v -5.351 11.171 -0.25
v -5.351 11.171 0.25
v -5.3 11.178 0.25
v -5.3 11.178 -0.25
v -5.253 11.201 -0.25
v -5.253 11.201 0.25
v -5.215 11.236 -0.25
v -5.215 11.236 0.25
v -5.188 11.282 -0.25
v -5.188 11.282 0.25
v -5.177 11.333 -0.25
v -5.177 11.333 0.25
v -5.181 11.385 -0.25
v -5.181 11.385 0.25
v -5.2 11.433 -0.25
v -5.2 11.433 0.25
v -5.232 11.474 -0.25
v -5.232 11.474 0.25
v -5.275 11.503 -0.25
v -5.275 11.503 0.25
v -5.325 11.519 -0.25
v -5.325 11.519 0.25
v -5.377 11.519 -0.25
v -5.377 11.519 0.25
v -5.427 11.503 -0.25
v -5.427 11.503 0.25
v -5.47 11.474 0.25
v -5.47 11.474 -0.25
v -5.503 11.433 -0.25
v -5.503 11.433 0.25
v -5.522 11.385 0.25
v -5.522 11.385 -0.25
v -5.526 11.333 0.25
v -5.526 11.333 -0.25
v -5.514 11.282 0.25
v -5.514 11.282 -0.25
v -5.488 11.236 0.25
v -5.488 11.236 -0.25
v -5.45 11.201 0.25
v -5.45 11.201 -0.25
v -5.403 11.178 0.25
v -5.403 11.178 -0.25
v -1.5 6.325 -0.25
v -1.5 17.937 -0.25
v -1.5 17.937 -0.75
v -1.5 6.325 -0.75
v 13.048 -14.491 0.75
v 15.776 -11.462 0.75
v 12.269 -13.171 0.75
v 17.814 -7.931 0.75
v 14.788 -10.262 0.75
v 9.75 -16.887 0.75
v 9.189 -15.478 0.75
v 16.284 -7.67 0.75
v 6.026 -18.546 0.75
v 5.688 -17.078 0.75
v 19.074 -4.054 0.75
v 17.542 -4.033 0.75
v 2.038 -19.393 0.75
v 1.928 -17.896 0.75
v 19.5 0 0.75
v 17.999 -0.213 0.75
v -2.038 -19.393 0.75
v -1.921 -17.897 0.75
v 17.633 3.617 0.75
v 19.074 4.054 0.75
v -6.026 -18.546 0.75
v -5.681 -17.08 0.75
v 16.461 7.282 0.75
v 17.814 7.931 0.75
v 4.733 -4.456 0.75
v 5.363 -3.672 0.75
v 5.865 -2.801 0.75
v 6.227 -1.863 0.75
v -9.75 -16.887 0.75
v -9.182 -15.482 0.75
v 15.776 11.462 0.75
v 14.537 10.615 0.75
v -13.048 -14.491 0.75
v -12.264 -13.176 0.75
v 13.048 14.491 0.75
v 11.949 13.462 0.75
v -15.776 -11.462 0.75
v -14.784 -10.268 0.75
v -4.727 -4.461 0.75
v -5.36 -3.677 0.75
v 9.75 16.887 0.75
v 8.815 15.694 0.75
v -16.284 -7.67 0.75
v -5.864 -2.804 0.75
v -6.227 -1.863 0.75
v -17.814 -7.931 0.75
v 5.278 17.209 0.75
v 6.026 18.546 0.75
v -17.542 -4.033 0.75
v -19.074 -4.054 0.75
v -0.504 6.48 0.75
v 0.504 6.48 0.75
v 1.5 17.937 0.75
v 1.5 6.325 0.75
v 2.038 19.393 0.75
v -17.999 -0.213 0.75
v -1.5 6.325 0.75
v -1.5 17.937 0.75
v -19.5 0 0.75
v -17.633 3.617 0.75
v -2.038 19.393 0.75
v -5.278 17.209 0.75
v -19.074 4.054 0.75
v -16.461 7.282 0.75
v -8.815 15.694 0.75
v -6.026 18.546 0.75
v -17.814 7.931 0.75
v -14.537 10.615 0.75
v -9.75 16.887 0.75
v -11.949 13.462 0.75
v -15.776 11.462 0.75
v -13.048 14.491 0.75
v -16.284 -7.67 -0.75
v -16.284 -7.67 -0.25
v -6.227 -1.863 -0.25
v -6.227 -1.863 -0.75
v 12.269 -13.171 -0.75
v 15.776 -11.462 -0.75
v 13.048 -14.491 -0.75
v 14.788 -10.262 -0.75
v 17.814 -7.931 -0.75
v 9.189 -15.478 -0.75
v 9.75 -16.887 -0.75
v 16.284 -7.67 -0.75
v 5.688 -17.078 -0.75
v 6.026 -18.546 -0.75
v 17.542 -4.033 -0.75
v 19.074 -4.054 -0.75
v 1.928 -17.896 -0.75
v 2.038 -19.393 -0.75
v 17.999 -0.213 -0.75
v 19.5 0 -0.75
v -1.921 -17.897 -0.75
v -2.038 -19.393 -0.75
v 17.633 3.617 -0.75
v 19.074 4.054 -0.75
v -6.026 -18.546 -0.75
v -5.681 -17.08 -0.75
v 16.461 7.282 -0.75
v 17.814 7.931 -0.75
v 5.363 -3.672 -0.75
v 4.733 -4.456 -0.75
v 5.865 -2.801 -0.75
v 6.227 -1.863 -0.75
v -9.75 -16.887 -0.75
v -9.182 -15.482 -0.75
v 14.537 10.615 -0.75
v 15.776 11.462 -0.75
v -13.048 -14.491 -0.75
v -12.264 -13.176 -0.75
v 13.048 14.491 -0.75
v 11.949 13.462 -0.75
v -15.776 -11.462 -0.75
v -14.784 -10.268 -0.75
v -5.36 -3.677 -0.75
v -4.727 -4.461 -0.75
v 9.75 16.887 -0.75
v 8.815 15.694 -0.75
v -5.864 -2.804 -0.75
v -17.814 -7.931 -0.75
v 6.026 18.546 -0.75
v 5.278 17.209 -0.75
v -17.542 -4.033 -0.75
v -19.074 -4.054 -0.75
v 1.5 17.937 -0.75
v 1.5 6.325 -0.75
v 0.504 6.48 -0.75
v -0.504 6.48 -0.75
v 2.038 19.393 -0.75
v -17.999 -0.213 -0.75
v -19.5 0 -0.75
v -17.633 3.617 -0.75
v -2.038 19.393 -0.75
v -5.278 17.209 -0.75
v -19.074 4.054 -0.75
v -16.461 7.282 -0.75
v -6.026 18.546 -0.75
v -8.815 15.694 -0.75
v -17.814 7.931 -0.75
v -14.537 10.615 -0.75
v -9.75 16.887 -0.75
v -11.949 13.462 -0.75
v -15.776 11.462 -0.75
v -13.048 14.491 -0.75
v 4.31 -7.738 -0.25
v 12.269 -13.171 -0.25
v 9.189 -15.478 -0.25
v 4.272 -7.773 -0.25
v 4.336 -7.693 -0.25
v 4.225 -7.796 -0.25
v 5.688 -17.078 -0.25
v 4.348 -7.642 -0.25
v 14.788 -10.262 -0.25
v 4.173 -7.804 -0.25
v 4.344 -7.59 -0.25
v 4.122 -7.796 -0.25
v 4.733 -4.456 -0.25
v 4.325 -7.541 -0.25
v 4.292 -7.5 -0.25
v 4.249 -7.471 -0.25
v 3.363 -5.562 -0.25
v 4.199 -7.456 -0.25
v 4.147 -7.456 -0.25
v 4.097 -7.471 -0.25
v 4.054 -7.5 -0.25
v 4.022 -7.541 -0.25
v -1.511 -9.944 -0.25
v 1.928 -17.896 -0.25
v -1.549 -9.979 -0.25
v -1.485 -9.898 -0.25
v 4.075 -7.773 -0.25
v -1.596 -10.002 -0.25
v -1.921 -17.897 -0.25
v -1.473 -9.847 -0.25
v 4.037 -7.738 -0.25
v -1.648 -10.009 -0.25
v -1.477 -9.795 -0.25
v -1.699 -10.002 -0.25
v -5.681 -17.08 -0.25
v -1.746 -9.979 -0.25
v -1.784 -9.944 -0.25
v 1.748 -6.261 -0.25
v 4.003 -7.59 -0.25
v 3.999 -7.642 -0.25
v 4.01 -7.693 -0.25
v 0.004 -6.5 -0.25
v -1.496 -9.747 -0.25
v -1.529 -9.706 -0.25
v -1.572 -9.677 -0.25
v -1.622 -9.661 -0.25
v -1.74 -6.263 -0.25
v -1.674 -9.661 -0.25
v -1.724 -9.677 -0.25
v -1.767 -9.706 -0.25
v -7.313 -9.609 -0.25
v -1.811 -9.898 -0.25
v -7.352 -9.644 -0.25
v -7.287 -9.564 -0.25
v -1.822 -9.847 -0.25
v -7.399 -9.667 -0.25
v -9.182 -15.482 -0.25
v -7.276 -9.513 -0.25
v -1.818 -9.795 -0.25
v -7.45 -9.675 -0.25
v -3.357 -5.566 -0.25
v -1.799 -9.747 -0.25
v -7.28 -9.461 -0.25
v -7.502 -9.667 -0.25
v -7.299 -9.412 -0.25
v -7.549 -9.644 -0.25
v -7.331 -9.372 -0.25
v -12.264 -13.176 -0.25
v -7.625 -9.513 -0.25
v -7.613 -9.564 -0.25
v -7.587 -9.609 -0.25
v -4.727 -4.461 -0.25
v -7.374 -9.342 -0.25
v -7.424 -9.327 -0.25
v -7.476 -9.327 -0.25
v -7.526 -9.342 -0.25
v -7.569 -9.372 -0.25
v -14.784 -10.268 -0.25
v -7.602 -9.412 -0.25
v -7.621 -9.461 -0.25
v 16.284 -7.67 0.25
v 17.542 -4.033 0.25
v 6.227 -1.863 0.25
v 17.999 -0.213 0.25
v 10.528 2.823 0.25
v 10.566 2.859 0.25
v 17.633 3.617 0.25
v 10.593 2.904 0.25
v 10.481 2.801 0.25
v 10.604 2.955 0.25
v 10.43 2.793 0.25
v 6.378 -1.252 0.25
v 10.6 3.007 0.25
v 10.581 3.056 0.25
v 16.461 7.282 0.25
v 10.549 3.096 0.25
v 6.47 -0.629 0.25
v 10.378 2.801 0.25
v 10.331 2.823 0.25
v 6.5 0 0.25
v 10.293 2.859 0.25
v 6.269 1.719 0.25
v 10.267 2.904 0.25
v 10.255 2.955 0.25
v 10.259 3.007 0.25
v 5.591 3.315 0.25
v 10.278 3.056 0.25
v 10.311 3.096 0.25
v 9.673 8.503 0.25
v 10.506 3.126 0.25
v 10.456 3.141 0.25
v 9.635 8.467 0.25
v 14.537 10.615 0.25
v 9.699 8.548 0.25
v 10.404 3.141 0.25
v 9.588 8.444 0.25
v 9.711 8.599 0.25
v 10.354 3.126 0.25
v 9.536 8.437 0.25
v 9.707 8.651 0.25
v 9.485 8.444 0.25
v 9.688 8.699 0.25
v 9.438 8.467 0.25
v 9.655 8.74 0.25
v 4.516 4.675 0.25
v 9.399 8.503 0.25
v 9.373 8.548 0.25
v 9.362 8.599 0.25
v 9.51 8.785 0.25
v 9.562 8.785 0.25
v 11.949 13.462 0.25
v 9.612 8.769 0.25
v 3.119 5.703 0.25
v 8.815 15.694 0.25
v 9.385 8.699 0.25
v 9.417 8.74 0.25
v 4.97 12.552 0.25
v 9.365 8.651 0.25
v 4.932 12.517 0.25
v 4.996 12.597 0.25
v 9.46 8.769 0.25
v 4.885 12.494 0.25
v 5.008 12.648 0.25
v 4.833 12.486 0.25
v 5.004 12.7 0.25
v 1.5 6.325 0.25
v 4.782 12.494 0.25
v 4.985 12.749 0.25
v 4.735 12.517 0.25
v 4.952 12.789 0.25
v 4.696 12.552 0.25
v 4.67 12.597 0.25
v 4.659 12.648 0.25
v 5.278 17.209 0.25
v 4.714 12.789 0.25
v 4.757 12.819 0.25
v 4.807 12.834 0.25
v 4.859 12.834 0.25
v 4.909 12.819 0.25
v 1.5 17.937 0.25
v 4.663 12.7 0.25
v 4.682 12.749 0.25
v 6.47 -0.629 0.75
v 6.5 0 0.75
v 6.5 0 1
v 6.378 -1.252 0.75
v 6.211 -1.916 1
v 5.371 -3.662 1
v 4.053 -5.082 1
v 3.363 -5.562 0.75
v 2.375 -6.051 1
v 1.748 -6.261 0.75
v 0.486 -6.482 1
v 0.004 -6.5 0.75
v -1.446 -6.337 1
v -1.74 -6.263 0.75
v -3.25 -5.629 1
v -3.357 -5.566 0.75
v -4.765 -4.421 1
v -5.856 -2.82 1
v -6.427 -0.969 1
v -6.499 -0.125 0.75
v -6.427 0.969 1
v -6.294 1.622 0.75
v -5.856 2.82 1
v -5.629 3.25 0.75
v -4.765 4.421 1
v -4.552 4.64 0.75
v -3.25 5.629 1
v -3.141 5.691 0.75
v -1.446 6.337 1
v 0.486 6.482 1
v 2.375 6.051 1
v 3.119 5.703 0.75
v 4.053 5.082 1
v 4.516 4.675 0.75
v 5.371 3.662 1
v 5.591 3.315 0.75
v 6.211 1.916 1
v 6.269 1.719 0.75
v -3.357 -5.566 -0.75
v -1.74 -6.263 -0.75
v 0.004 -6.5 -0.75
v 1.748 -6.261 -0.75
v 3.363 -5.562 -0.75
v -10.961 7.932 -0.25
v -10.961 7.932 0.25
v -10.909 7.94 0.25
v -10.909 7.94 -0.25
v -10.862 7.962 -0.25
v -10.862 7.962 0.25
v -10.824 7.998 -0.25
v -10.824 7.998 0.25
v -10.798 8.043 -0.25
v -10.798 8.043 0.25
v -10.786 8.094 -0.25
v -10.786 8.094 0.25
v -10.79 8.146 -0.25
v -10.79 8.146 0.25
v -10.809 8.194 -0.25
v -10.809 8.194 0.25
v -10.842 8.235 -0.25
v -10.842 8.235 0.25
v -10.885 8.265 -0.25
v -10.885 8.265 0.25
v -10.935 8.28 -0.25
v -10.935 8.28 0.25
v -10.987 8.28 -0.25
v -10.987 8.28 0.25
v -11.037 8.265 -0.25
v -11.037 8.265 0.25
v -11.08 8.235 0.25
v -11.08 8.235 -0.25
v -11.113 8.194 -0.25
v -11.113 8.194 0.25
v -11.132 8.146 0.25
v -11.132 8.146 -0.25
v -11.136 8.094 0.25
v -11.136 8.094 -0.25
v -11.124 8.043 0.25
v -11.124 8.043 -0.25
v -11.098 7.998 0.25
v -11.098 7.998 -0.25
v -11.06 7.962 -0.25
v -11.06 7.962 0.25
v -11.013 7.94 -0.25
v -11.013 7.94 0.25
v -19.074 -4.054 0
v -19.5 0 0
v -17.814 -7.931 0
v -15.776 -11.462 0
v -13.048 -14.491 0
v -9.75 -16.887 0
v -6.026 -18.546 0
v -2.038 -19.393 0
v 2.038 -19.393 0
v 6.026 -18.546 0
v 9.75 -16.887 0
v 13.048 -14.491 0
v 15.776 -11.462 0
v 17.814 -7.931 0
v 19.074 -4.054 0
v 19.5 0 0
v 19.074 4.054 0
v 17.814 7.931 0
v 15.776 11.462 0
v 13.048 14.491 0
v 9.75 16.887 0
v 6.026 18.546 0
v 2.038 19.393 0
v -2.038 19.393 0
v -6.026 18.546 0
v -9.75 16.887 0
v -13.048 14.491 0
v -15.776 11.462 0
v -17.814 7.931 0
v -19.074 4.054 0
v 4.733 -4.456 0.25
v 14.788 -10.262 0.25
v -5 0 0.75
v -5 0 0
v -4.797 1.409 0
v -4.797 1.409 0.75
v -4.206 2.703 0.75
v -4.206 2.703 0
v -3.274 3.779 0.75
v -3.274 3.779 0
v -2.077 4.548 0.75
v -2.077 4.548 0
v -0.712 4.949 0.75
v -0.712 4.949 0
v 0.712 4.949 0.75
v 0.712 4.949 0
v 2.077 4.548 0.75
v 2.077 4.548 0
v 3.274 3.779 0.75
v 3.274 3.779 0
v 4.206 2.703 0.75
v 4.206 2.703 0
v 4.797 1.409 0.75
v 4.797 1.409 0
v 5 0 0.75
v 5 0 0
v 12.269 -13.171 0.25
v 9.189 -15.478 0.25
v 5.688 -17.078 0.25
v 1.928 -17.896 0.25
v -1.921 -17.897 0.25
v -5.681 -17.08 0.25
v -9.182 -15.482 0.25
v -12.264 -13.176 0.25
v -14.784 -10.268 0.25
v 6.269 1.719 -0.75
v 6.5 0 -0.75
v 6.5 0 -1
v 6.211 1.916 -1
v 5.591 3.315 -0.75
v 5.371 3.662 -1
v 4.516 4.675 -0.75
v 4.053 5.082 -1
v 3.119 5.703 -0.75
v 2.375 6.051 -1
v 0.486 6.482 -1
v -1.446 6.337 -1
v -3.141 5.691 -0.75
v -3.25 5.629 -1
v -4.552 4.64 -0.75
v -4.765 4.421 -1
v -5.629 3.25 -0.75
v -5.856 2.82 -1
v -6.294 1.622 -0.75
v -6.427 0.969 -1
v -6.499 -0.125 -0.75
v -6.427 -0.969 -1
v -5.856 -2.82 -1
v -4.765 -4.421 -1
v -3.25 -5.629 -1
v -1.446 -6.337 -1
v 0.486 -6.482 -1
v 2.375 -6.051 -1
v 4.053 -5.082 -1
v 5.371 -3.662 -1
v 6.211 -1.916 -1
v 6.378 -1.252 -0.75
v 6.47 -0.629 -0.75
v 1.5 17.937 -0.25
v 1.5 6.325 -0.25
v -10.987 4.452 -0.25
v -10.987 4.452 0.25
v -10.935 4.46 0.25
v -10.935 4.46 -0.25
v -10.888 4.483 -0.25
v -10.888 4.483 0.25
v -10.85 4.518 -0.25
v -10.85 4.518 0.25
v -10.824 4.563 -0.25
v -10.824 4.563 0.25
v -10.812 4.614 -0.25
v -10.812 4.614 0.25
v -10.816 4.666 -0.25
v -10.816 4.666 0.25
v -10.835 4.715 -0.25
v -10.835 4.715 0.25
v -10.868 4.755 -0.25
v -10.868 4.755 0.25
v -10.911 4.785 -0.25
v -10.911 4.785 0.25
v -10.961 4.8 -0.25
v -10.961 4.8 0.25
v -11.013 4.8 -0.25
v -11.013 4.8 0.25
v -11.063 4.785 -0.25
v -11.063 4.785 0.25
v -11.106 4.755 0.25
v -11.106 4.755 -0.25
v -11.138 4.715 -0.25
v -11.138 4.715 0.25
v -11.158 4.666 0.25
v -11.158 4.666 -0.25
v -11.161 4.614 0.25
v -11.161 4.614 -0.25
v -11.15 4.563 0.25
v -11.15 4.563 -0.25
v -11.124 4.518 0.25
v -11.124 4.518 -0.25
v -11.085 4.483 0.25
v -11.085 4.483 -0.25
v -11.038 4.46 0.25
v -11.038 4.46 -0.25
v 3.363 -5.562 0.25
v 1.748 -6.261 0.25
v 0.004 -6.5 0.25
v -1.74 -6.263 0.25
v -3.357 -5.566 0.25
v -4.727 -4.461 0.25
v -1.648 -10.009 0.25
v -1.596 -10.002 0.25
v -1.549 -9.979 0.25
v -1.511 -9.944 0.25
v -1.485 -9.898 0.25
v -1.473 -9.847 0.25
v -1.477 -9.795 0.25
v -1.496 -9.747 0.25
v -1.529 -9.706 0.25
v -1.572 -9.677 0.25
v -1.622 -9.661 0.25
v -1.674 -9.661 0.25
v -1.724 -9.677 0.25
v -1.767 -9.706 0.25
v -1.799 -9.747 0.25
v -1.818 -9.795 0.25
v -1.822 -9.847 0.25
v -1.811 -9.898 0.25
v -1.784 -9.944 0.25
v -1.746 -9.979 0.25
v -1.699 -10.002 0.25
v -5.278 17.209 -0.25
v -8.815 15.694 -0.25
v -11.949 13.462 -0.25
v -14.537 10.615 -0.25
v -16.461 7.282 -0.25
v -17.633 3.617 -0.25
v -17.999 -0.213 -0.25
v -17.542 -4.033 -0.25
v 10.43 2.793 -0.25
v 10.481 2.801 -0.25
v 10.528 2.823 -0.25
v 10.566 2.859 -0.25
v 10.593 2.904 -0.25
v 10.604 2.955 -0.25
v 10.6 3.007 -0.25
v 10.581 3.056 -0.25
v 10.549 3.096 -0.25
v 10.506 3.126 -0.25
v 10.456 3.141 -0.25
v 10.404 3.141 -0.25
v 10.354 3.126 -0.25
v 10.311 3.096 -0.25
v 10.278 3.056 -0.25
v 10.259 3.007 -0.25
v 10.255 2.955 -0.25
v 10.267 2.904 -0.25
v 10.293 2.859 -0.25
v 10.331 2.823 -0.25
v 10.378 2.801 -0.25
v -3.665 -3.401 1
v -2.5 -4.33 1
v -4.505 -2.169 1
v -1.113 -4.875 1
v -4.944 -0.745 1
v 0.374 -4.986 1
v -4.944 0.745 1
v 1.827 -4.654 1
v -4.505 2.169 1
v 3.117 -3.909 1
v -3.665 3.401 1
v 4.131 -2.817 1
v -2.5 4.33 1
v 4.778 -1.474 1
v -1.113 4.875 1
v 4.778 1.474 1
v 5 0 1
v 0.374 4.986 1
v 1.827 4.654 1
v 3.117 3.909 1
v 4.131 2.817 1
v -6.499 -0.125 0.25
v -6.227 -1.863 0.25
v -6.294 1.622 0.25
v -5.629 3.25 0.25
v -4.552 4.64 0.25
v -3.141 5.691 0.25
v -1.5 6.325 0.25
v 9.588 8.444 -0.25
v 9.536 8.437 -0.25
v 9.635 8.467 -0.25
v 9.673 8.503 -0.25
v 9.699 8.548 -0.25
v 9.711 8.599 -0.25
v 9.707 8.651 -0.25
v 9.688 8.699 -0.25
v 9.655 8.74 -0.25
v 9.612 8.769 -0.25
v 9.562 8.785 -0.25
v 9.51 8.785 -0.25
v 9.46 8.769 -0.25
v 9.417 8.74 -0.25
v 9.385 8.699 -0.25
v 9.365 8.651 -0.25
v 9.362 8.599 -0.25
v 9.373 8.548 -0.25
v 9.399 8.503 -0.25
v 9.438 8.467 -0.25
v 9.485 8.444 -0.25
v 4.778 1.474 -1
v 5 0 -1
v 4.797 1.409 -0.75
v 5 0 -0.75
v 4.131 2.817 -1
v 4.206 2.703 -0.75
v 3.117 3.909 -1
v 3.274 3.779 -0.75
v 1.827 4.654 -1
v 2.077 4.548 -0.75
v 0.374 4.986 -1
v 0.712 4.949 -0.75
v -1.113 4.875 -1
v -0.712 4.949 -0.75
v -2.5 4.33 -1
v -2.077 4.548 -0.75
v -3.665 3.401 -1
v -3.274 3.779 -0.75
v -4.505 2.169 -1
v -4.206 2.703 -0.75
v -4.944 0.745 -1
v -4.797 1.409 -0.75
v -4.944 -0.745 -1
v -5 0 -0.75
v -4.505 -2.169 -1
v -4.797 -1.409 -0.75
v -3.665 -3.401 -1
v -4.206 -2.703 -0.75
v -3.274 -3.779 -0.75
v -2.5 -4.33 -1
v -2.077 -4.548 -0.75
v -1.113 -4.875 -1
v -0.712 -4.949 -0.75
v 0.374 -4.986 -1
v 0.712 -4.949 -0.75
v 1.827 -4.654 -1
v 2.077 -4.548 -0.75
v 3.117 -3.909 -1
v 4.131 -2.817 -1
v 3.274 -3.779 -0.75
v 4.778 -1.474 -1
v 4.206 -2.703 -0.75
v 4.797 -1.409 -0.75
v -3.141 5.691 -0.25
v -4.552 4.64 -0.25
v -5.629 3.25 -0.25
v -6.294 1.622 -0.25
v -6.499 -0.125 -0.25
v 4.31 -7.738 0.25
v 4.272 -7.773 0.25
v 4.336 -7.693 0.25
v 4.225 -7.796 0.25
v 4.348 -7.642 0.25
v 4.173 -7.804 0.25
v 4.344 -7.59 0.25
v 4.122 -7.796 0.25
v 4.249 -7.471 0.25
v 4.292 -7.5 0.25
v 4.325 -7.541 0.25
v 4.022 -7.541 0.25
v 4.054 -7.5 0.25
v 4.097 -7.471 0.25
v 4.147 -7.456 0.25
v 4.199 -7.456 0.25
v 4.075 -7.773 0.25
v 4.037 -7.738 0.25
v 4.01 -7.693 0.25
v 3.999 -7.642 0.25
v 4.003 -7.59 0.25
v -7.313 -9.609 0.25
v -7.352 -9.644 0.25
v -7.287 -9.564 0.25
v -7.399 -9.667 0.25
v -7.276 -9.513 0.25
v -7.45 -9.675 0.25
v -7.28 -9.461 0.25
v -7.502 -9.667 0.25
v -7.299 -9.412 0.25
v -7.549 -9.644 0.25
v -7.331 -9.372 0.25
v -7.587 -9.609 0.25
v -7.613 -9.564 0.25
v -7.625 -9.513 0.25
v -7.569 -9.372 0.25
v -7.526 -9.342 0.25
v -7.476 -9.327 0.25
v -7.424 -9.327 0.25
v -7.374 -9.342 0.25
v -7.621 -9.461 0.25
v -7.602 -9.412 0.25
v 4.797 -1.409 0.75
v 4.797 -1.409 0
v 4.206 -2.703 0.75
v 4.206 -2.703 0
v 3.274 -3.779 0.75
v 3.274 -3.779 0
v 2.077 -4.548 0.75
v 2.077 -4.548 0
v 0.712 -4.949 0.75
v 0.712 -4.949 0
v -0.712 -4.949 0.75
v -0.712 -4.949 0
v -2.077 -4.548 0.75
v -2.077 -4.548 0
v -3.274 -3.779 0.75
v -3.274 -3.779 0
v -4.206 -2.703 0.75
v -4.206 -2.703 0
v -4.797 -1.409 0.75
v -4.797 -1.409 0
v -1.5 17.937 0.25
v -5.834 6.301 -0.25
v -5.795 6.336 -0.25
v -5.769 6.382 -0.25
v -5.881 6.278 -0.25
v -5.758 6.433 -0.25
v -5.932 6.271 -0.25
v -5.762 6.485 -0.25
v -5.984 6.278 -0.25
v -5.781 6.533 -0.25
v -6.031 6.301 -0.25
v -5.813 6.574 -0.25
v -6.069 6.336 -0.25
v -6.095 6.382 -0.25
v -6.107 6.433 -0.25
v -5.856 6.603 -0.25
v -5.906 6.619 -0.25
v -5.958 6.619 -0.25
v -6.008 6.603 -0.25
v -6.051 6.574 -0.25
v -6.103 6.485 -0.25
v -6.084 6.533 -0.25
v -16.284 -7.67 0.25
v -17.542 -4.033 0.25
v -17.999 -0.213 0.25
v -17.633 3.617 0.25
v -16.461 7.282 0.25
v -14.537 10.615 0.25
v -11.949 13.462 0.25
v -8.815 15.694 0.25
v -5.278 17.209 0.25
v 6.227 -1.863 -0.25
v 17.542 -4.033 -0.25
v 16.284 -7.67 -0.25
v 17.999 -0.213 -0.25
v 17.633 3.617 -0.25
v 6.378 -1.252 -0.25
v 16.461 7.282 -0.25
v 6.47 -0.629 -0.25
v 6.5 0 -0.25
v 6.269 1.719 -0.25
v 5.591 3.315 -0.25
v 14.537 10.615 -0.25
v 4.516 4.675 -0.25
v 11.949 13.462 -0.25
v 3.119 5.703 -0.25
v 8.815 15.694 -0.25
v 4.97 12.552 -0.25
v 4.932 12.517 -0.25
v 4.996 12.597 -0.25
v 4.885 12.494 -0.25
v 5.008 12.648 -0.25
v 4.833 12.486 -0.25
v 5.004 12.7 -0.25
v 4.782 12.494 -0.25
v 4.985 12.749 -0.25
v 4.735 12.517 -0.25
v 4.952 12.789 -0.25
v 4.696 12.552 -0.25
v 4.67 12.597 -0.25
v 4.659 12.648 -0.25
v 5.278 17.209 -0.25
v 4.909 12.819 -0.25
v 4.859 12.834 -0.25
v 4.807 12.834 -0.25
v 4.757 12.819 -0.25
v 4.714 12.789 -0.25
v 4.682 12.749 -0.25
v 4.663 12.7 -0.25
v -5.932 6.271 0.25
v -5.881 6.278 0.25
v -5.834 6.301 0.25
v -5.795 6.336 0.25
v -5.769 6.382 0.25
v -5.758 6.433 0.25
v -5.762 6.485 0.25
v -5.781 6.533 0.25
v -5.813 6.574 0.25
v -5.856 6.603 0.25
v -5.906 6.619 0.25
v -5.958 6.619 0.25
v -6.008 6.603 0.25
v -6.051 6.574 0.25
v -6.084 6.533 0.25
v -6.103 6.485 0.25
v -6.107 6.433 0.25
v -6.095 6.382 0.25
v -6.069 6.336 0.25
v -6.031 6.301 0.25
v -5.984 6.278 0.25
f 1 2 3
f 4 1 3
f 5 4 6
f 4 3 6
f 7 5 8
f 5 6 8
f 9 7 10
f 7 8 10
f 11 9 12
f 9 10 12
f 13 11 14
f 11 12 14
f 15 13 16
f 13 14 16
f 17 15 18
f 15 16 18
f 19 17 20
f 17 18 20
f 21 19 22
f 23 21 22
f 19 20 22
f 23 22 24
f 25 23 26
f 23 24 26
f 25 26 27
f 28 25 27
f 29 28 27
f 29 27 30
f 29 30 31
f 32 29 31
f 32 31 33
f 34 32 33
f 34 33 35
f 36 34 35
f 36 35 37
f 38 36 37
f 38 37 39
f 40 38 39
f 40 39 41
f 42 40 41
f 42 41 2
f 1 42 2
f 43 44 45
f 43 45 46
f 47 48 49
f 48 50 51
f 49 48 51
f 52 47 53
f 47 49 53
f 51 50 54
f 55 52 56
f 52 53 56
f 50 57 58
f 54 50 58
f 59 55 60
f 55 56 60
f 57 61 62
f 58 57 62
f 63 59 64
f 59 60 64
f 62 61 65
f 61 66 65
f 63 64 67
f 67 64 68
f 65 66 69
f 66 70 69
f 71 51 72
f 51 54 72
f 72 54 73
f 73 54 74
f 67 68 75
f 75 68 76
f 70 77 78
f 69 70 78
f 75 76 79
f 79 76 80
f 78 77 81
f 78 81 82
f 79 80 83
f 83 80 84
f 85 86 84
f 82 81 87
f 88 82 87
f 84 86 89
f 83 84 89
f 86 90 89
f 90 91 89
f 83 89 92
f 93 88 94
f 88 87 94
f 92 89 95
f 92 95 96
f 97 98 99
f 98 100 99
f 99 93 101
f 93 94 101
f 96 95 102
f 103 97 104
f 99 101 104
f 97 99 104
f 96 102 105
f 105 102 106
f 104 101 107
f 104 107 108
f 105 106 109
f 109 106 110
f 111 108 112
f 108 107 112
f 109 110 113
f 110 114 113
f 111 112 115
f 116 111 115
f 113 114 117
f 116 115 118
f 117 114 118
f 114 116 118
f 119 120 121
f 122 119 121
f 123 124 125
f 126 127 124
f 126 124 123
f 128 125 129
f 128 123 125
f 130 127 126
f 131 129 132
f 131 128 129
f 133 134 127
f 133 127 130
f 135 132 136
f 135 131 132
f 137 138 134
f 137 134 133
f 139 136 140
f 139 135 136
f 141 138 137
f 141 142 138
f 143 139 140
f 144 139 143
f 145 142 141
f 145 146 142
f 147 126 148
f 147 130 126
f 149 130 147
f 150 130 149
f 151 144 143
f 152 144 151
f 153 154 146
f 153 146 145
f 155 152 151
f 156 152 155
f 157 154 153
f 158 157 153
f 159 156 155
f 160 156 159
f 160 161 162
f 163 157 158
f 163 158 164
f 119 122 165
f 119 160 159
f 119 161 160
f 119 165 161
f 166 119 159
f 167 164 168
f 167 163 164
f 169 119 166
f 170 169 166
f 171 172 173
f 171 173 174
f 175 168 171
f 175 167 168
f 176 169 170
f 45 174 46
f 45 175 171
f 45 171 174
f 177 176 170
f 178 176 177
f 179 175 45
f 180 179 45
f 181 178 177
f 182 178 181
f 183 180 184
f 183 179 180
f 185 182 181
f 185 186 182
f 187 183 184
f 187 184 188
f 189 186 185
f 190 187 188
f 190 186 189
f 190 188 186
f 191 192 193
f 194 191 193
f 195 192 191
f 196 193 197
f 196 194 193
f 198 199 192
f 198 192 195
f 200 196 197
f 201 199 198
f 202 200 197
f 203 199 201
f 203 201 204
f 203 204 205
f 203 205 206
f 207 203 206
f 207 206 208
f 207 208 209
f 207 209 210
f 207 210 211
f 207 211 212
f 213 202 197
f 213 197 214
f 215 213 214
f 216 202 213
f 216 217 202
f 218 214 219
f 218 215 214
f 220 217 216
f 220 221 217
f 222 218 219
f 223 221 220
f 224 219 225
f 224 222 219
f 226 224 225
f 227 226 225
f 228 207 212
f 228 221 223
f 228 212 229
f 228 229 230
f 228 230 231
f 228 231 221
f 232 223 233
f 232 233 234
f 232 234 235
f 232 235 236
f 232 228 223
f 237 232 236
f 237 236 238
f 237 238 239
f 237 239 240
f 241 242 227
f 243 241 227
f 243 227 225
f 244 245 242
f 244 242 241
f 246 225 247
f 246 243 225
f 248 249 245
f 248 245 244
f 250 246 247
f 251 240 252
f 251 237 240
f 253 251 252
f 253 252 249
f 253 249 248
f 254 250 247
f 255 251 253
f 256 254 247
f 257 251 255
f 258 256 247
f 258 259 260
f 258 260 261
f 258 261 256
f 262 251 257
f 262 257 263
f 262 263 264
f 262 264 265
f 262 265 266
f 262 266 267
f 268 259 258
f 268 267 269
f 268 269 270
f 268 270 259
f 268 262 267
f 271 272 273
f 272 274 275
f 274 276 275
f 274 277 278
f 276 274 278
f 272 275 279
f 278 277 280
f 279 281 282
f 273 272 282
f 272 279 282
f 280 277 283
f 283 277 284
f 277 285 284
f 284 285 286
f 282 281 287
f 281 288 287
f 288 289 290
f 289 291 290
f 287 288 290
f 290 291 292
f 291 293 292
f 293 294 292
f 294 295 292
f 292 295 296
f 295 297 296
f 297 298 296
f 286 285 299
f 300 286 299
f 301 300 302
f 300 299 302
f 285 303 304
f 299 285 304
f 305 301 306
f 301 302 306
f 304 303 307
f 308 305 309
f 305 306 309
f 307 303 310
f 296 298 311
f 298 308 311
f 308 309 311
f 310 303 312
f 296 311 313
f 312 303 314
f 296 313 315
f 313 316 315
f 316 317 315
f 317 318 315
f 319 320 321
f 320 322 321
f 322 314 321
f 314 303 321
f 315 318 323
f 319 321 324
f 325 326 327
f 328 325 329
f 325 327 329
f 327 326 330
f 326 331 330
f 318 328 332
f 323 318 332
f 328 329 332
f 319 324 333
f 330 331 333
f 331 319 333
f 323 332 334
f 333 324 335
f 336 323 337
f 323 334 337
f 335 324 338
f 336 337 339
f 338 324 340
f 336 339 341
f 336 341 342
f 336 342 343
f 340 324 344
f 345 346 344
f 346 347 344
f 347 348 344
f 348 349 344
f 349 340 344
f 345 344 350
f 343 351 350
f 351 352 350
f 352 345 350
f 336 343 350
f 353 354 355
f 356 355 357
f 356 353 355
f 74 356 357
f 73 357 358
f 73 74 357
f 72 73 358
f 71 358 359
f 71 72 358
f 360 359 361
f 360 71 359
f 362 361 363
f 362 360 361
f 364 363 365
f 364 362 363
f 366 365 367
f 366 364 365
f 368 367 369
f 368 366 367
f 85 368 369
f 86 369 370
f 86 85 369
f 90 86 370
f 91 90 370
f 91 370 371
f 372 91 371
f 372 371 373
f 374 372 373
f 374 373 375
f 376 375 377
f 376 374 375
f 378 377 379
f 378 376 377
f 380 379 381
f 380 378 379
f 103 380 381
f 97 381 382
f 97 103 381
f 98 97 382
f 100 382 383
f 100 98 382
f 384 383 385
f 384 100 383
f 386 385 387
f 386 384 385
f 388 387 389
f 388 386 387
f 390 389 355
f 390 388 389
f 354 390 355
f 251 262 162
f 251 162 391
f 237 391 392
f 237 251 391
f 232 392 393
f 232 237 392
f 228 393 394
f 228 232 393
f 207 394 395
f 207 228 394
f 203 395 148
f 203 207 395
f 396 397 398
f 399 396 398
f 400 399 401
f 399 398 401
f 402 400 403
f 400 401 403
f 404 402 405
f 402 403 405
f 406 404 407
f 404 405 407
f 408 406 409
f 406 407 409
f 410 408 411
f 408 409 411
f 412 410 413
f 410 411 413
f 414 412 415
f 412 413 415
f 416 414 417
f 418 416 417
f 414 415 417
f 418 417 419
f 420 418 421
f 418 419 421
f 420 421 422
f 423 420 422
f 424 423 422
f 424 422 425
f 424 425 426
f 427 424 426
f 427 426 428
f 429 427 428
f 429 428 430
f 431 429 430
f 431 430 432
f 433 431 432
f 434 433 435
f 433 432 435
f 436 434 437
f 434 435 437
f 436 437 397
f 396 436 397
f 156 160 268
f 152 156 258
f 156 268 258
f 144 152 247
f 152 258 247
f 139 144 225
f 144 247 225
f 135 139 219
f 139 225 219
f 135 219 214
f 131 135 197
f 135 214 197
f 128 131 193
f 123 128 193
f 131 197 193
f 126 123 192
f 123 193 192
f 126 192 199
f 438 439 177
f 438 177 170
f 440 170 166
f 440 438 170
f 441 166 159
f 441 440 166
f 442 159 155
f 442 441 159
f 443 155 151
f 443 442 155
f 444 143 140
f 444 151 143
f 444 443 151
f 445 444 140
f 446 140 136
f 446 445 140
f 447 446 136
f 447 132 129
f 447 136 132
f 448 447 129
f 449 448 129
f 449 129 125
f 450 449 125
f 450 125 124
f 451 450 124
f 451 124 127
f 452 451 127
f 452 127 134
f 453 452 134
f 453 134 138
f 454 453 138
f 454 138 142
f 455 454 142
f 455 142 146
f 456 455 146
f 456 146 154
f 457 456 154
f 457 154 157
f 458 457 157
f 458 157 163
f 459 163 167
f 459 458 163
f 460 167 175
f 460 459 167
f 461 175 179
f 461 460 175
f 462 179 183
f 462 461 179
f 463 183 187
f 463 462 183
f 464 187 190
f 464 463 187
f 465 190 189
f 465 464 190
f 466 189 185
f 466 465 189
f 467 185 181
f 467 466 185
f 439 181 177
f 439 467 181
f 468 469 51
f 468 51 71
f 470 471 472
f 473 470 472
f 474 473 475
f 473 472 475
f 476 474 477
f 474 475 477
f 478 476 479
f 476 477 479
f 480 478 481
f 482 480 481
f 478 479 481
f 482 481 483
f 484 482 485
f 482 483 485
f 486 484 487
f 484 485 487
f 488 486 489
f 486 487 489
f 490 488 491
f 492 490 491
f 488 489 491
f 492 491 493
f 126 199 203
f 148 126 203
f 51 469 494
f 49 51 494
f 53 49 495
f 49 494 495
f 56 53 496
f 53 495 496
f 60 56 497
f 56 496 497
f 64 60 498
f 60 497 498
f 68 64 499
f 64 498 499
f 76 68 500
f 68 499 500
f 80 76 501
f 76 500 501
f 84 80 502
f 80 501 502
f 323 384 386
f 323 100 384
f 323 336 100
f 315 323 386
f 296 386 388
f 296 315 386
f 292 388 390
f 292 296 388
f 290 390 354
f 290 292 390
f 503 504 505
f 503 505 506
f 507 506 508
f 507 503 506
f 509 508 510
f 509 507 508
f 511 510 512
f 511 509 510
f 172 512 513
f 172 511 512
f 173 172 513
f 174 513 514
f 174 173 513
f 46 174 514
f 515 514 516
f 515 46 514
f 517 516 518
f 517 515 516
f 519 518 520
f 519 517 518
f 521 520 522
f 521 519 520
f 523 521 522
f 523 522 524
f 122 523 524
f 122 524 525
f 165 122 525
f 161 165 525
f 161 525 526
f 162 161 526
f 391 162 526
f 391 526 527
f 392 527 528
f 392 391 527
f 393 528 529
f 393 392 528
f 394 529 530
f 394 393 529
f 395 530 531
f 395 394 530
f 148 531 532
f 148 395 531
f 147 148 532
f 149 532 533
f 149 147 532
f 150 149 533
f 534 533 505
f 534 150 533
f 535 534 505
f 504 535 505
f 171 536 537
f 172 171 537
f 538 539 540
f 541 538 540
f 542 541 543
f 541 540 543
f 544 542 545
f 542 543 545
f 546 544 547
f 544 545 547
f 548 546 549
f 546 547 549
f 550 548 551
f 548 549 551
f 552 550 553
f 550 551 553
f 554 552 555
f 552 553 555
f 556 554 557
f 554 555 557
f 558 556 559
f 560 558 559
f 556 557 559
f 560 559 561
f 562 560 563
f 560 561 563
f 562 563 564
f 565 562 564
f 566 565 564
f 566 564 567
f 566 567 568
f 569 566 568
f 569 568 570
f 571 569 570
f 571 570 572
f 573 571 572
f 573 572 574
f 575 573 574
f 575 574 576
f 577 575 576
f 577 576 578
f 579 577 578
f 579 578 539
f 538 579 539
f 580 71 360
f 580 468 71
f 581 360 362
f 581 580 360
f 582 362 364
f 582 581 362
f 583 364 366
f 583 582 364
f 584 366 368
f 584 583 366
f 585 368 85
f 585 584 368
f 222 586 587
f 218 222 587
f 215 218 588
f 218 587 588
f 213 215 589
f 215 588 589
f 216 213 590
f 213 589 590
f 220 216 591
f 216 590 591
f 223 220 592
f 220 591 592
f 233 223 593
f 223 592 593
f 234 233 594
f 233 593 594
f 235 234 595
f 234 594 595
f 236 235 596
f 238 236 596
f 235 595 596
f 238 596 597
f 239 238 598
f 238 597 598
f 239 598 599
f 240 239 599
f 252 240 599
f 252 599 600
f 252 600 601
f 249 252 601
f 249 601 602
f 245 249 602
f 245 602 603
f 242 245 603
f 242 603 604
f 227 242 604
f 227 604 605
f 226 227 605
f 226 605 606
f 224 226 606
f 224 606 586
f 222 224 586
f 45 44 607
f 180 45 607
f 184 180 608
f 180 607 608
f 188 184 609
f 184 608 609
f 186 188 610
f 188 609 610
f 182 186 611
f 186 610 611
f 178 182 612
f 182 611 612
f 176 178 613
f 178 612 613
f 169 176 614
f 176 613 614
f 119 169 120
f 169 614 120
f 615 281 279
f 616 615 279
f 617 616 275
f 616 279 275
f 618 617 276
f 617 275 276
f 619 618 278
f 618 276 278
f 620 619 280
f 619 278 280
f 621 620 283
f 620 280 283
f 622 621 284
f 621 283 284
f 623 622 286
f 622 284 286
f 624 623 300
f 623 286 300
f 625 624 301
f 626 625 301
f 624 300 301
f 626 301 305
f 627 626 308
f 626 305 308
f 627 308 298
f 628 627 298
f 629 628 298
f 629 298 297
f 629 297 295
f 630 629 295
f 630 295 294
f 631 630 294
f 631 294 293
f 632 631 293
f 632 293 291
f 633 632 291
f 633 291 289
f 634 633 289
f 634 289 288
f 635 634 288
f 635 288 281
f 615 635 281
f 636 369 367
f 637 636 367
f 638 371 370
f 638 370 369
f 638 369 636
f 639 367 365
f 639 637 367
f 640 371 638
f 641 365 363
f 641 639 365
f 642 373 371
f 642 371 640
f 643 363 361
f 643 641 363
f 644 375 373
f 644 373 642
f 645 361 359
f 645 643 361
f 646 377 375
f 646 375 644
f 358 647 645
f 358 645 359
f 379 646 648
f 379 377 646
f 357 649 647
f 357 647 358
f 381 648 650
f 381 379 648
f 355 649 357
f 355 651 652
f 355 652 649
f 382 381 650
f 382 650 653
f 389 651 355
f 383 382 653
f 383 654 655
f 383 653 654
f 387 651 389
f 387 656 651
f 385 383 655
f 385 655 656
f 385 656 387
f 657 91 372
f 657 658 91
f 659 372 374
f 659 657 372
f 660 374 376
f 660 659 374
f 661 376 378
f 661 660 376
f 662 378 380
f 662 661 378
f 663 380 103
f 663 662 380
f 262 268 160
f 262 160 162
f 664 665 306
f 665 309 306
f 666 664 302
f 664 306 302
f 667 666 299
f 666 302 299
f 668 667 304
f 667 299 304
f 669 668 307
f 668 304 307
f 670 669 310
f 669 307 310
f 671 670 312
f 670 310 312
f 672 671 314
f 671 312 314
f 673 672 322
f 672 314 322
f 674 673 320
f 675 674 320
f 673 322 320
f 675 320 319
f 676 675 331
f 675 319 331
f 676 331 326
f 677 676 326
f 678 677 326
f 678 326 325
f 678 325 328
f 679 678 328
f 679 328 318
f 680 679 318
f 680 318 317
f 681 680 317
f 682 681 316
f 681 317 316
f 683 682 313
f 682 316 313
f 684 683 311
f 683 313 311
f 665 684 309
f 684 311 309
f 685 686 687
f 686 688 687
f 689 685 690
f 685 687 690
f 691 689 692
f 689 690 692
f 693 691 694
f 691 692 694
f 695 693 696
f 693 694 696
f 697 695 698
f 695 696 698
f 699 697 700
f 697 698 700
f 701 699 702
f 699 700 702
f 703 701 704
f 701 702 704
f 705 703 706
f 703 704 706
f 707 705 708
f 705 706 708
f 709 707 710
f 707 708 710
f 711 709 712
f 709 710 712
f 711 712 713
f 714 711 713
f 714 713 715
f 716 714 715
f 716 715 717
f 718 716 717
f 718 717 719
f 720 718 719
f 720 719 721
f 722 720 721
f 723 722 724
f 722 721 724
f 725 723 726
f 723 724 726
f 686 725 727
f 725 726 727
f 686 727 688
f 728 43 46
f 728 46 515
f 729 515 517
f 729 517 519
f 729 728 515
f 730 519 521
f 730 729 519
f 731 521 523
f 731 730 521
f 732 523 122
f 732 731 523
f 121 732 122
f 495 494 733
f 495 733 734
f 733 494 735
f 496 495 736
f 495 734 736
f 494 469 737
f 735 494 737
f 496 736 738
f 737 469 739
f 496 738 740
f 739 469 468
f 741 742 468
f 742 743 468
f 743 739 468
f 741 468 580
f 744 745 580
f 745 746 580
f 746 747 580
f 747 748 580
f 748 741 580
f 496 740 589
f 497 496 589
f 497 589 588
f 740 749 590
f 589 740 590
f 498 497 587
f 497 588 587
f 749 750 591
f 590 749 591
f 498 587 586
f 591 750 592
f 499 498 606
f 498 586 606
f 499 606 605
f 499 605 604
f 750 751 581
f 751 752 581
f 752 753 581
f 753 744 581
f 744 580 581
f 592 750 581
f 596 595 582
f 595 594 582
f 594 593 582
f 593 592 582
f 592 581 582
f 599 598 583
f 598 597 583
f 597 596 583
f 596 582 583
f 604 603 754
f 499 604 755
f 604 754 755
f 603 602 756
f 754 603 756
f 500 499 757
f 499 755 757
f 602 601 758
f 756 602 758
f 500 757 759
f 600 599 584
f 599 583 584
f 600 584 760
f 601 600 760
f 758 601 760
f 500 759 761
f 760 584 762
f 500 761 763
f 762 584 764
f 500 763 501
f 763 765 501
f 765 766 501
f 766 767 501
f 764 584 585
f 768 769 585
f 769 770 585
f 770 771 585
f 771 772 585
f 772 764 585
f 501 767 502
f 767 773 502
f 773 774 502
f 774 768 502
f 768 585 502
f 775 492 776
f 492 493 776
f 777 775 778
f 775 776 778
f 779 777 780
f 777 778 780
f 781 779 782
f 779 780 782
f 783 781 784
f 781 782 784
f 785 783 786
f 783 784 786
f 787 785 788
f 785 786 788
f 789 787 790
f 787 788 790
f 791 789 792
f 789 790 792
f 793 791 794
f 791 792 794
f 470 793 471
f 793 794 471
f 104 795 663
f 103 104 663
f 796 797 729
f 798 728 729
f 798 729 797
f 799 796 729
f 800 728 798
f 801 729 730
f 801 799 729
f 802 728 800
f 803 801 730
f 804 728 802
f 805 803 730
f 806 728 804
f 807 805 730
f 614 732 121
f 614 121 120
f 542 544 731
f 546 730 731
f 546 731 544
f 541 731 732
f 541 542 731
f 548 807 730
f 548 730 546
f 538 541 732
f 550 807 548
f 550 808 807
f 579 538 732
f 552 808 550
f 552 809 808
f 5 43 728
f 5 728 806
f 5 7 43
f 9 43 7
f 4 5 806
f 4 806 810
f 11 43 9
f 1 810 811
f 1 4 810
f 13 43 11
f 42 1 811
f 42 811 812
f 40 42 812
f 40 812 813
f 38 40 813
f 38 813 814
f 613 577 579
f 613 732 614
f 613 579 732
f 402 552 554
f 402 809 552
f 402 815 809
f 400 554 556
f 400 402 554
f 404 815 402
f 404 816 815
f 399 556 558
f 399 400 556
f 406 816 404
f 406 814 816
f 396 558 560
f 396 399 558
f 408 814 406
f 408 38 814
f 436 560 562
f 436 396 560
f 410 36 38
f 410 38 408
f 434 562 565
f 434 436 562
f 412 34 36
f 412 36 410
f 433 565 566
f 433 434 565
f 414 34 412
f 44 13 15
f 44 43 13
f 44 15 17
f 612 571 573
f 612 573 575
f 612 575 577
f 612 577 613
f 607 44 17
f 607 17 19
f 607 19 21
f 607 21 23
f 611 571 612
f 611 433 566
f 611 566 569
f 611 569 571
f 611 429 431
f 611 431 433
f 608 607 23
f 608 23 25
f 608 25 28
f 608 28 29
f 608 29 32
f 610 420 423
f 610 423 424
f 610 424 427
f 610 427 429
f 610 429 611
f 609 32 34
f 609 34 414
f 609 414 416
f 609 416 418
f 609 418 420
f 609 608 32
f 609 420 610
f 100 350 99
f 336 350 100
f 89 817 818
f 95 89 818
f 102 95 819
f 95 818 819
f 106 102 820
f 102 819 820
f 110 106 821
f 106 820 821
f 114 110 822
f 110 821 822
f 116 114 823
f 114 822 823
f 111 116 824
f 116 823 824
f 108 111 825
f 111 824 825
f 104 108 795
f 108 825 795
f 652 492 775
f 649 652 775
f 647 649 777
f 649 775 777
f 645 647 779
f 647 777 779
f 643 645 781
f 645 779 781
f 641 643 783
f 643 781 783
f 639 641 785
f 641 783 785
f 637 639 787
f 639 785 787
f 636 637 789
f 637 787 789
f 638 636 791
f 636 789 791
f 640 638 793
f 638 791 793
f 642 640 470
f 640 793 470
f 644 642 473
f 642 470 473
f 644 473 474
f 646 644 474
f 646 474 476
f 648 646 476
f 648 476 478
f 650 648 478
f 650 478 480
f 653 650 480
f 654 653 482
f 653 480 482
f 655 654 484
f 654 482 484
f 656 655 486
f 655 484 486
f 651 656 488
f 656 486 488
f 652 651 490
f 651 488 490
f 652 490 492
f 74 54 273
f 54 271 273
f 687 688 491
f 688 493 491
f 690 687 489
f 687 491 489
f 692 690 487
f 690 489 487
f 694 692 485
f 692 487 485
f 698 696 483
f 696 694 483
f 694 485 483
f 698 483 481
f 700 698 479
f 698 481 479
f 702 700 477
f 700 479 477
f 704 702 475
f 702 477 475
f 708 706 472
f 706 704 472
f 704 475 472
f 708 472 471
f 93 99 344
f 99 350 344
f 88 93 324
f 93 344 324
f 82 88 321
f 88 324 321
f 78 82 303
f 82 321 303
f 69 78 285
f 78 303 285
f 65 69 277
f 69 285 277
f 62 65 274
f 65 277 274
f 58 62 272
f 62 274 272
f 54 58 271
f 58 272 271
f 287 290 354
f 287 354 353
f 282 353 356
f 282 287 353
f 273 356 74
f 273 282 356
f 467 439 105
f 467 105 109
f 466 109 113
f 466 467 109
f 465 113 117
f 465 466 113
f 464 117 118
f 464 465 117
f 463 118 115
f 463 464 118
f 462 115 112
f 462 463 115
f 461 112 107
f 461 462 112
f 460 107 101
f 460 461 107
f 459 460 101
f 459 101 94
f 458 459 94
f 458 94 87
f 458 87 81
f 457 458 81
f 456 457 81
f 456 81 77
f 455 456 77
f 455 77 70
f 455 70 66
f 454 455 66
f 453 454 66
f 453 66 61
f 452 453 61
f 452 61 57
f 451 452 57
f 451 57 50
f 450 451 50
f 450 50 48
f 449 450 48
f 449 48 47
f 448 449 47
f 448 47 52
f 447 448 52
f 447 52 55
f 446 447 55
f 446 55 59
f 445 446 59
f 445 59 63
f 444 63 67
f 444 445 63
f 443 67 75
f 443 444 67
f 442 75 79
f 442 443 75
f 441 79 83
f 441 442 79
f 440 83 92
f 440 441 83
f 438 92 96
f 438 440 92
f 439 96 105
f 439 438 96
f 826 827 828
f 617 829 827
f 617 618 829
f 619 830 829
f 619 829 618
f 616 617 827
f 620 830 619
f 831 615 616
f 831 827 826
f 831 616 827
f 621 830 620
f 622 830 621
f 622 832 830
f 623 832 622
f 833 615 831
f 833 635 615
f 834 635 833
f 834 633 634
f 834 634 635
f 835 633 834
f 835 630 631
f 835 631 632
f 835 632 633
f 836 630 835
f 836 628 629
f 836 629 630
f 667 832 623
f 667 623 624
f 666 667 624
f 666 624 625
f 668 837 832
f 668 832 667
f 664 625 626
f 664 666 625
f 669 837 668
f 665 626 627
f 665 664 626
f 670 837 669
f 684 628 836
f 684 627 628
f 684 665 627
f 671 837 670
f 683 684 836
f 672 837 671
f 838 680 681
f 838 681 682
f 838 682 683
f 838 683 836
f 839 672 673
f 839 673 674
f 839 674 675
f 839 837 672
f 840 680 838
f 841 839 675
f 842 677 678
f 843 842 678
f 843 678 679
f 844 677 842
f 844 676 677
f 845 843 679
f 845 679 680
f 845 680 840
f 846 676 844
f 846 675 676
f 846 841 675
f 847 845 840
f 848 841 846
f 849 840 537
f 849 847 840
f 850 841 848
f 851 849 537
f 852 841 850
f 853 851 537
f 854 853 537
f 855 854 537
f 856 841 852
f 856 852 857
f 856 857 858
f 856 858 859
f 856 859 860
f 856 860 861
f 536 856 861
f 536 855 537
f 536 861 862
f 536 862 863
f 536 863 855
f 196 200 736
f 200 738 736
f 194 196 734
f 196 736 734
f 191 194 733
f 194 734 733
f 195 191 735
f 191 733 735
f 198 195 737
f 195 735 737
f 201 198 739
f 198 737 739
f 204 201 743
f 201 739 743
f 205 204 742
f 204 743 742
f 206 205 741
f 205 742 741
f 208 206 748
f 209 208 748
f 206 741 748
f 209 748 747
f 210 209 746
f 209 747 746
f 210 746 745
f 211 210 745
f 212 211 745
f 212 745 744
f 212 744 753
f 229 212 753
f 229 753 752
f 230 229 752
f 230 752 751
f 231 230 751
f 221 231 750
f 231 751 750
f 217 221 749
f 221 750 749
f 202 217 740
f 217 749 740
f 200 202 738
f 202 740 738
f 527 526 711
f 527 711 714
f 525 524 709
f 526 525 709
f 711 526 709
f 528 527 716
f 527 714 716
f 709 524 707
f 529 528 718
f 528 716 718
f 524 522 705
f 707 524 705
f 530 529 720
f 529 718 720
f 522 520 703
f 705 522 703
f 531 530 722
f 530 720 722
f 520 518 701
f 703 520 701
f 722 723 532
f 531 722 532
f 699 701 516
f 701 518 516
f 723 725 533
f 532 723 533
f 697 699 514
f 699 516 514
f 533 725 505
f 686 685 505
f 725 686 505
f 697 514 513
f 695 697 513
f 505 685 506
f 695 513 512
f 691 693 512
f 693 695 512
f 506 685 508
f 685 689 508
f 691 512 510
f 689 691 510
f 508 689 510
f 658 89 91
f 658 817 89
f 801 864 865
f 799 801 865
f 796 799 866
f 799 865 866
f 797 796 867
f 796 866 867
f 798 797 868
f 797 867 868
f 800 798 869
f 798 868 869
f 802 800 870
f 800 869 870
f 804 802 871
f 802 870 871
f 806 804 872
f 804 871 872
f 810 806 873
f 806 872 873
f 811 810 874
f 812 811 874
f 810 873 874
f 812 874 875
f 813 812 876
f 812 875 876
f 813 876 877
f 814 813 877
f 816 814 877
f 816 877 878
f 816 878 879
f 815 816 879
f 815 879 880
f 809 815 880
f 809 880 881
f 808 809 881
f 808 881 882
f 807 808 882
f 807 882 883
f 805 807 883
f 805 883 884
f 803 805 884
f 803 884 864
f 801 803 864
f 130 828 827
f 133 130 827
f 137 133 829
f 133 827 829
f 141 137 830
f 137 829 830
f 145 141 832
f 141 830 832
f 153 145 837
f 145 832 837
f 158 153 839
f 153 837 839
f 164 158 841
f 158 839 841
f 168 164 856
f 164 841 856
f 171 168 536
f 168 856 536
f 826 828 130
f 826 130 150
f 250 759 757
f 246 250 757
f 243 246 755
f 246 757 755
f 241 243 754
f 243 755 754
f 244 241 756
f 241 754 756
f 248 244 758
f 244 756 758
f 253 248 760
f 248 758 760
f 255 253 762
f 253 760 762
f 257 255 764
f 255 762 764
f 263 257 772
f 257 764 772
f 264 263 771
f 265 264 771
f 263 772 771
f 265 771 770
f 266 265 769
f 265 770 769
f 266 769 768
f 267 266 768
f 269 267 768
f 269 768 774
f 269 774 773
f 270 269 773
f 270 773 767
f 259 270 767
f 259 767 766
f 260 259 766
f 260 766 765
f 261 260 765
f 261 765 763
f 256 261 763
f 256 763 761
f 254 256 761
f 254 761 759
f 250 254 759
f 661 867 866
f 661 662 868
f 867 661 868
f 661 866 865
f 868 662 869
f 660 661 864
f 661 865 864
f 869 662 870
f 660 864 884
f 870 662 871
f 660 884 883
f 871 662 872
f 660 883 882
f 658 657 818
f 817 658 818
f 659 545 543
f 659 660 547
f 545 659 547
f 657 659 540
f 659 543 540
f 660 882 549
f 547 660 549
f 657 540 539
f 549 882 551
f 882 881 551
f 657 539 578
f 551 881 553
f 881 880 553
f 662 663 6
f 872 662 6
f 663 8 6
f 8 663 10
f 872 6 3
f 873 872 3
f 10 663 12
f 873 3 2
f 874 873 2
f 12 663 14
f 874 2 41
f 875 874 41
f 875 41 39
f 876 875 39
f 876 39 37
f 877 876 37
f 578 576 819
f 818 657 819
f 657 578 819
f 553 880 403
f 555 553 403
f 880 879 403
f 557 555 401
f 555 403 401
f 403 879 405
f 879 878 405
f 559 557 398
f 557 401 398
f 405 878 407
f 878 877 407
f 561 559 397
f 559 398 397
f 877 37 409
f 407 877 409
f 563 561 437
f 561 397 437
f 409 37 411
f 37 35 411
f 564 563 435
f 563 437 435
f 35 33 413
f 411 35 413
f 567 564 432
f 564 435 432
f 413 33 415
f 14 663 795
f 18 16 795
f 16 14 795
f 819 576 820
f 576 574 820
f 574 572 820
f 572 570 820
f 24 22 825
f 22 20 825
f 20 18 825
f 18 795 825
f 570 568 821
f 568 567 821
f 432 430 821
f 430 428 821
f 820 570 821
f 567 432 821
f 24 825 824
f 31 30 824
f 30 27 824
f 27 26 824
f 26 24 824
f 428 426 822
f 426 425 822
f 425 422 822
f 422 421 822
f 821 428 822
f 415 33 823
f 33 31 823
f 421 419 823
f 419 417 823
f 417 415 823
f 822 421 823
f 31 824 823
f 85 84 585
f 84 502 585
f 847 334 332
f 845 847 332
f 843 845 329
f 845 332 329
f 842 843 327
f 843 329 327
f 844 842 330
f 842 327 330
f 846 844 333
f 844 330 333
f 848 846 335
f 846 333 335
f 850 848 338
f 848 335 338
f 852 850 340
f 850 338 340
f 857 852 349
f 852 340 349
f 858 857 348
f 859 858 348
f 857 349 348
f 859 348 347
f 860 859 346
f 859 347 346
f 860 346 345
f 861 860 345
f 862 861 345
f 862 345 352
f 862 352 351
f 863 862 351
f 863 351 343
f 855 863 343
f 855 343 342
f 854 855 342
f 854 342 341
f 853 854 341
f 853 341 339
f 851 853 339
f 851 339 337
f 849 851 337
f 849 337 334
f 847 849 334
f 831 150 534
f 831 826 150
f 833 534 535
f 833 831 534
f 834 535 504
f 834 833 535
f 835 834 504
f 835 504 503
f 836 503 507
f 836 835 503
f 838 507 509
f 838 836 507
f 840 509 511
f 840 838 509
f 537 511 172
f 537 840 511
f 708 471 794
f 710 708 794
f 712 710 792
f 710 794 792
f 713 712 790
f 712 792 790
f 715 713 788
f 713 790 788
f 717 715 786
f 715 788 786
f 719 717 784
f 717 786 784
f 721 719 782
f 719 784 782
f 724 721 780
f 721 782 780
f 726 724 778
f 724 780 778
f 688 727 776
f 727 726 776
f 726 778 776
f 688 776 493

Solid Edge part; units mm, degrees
sketch "Sketch1" plane through (0, 0, 0) normal (0, 0, -1) x (-1, 0, 0)
  circle A0 centre (0, 0) radius 5
  arc A1 (4.7272, -4.4613) -> (-4.7325, -4.4557) centre (0, 0) cw
  line L0 (-14.7885, -10.2616) -> (-4.7325, -4.4557)
  arc A2 (14.7842, -10.2677) -> (-14.7885, -10.2616) centre (0, 0) cw
  line L1 (14.7842, -10.2677) -> (4.7272, -4.4613)
  line L2 (16.2842, -7.6697) -> (6.2272, -1.8632)
  arc A3 (1.5, 17.9374) -> (16.2842, -7.6697) centre (0, 0) cw
  line L3 (1.5, 17.9374) -> (1.5, 6.3246)
  arc A4 (1.5, 6.3246) -> (6.2272, -1.8632) centre (0, 0) cw
  arc A5 (-6.2272, -1.8632) -> (-1.5, 6.3246) centre (0, 0) cw
  line L4 (-1.5, 17.9374) -> (-1.5, 6.3246)
  line L5 (-16.2842, -7.6697) -> (-6.2272, -1.8632)
  arc A6 (-16.2842, -7.6697) -> (-1.5, 17.9374) centre (0, 0) cw
  circle A7 centre (0, 0) radius 19.5
extrude "Protrusion1" add sketch "Sketch1" along normal mid plane 1.5
sketch "Sketch2" plane through (0, 0, 0) normal (0, 0, 1) x (1, 0, 0)
  circle A0 centre (0, 0) radius 5
  circle A1 centre (0, 0) radius 6.5
  dimension "D1" = 11.6128
extrude "Kihúzás_2" add sketch "Sketch2" along normal mid plane 2
sketch "Sketch3" plane through (0, 0, 0) normal (0, 0, 1) x (1, 0, 0)
  arc A0 (-16.2842, -7.6697) -> (-1.5, 17.9374) centre (0, 0) cw
  line L0 (-1.5, 17.9374) -> (-1.5, 6.3246)
  arc A1 (-1.5, 6.3246) -> (-6.2272, -1.8632) centre (0, 0) ccw
  line L1 (-6.2272, -1.8632) -> (-16.2842, -7.6697)
  line L2 (1.5, 6.3246) -> (1.5, 17.9374)
  arc A2 (1.5, 17.9374) -> (16.2842, -7.6697) centre (0, 0) cw
  line L3 (16.2842, -7.6697) -> (6.2272, -1.8632)
  arc A3 (6.2272, -1.8632) -> (1.5, 6.3246) centre (0, 0) ccw
  line L4 (4.7325, -4.4557) -> (14.7885, -10.2616)
  arc A4 (14.7885, -10.2616) -> (-14.7842, -10.2677) centre (0, 0) cw
  line L5 (-14.7842, -10.2677) -> (-4.7272, -4.4613)
  arc A5 (-4.7272, -4.4613) -> (4.7325, -4.4557) centre (0, 0) ccw
extrude "Kihúzás_3" add sketch "Sketch3" along normal mid plane 0.5
hole "Furat_1" at (-10.961, 8.1069, 0.25) direction (0, 0, -1) diameter 0.35 end up to next
hole "Hole1" at (-10.9869, 4.6272, 0.25) direction (0, 0, -1) diameter 0.35 end up to next
hole "Hole2" at (-5.3514, 11.3456, 0.25) direction (0, 0, -1) diameter 0.35 end up to next
hole "Hole3" at (-5.9322, 6.4456, 0.25) direction (0, 0, -1) diameter 0.35 end up to next
hole "Hole4" at (4.8333, 12.6611, 0.25) direction (0, 0, -1) diameter 0.35 end up to next
hole "Hole5" at (9.5361, 8.6117, 0.25) direction (0, 0, -1) diameter 0.35 end up to next
hole "Hole6" at (10.4296, 2.968, 0.25) direction (0, 0, -1) diameter 0.35 end up to next
hole "Hole7" at (-1.6476, -9.8344, 0.25) direction (0, 0, -1) diameter 0.35 end up to next
hole "Hole8" at (-7.4503, -9.4999, 0.25) direction (0, 0, -1) diameter 0.35 end up to next
hole "Hole9" at (4.1734, -7.6286, 0.25) direction (0, 0, -1) diameter 0.35 end up to next
properties material "Plastic ABS (medium strong)"
